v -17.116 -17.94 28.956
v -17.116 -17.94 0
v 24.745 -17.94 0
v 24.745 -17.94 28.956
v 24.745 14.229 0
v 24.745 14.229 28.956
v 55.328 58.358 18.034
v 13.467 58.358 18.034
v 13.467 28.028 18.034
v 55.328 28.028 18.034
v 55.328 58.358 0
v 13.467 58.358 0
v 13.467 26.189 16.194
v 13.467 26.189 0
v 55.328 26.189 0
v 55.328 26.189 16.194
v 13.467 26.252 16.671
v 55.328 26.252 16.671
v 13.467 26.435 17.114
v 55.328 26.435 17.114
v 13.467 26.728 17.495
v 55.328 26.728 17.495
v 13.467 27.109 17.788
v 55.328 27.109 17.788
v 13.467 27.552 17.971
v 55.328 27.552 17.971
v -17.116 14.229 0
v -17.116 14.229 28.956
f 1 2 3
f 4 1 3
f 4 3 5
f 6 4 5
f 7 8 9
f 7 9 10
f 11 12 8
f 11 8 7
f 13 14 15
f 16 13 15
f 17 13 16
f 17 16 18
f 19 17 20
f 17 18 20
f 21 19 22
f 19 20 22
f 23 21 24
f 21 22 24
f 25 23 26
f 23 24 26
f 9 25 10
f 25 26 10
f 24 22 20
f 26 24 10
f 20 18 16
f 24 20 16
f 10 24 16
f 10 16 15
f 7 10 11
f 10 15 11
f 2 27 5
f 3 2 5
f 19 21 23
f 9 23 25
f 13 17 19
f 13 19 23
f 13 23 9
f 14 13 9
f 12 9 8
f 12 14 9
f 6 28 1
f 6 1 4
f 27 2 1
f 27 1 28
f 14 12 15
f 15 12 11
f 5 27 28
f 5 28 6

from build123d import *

# Parameters (mm, degrees)
F0_W     = 41.860901
F0_H     = 32.16897
F1_DEPTH = 18.034
F2_R     = 1.839631
F0_H_2   = 32.168969
F3_DEPTH = 28.956


with BuildPart() as f1:
    # F0 (on Top) → F1 (new body)
    with BuildSketch(Plane.XY):
        with Locations((34.397354, 42.273325)):
            Rectangle(F0_W, F0_H)
    extrude(amount=F1_DEPTH)

    # F2
    f2_edges = [f1.edges().sort_by_distance(p)[0] for p in [
        (34.397354, 26.18884, 18.034),
    ]]
    fillet(f2_edges, radius=F2_R)


with BuildPart() as f3:
    # F0 (on Top) → F3 (new body)
    with BuildSketch(Plane.XY):
        with Locations((3.814909, -1.855902)):
            Rectangle(F0_W, F0_H_2)
    extrude(amount=F3_DEPTH)


solid = Compound([f1.part, f3.part])
